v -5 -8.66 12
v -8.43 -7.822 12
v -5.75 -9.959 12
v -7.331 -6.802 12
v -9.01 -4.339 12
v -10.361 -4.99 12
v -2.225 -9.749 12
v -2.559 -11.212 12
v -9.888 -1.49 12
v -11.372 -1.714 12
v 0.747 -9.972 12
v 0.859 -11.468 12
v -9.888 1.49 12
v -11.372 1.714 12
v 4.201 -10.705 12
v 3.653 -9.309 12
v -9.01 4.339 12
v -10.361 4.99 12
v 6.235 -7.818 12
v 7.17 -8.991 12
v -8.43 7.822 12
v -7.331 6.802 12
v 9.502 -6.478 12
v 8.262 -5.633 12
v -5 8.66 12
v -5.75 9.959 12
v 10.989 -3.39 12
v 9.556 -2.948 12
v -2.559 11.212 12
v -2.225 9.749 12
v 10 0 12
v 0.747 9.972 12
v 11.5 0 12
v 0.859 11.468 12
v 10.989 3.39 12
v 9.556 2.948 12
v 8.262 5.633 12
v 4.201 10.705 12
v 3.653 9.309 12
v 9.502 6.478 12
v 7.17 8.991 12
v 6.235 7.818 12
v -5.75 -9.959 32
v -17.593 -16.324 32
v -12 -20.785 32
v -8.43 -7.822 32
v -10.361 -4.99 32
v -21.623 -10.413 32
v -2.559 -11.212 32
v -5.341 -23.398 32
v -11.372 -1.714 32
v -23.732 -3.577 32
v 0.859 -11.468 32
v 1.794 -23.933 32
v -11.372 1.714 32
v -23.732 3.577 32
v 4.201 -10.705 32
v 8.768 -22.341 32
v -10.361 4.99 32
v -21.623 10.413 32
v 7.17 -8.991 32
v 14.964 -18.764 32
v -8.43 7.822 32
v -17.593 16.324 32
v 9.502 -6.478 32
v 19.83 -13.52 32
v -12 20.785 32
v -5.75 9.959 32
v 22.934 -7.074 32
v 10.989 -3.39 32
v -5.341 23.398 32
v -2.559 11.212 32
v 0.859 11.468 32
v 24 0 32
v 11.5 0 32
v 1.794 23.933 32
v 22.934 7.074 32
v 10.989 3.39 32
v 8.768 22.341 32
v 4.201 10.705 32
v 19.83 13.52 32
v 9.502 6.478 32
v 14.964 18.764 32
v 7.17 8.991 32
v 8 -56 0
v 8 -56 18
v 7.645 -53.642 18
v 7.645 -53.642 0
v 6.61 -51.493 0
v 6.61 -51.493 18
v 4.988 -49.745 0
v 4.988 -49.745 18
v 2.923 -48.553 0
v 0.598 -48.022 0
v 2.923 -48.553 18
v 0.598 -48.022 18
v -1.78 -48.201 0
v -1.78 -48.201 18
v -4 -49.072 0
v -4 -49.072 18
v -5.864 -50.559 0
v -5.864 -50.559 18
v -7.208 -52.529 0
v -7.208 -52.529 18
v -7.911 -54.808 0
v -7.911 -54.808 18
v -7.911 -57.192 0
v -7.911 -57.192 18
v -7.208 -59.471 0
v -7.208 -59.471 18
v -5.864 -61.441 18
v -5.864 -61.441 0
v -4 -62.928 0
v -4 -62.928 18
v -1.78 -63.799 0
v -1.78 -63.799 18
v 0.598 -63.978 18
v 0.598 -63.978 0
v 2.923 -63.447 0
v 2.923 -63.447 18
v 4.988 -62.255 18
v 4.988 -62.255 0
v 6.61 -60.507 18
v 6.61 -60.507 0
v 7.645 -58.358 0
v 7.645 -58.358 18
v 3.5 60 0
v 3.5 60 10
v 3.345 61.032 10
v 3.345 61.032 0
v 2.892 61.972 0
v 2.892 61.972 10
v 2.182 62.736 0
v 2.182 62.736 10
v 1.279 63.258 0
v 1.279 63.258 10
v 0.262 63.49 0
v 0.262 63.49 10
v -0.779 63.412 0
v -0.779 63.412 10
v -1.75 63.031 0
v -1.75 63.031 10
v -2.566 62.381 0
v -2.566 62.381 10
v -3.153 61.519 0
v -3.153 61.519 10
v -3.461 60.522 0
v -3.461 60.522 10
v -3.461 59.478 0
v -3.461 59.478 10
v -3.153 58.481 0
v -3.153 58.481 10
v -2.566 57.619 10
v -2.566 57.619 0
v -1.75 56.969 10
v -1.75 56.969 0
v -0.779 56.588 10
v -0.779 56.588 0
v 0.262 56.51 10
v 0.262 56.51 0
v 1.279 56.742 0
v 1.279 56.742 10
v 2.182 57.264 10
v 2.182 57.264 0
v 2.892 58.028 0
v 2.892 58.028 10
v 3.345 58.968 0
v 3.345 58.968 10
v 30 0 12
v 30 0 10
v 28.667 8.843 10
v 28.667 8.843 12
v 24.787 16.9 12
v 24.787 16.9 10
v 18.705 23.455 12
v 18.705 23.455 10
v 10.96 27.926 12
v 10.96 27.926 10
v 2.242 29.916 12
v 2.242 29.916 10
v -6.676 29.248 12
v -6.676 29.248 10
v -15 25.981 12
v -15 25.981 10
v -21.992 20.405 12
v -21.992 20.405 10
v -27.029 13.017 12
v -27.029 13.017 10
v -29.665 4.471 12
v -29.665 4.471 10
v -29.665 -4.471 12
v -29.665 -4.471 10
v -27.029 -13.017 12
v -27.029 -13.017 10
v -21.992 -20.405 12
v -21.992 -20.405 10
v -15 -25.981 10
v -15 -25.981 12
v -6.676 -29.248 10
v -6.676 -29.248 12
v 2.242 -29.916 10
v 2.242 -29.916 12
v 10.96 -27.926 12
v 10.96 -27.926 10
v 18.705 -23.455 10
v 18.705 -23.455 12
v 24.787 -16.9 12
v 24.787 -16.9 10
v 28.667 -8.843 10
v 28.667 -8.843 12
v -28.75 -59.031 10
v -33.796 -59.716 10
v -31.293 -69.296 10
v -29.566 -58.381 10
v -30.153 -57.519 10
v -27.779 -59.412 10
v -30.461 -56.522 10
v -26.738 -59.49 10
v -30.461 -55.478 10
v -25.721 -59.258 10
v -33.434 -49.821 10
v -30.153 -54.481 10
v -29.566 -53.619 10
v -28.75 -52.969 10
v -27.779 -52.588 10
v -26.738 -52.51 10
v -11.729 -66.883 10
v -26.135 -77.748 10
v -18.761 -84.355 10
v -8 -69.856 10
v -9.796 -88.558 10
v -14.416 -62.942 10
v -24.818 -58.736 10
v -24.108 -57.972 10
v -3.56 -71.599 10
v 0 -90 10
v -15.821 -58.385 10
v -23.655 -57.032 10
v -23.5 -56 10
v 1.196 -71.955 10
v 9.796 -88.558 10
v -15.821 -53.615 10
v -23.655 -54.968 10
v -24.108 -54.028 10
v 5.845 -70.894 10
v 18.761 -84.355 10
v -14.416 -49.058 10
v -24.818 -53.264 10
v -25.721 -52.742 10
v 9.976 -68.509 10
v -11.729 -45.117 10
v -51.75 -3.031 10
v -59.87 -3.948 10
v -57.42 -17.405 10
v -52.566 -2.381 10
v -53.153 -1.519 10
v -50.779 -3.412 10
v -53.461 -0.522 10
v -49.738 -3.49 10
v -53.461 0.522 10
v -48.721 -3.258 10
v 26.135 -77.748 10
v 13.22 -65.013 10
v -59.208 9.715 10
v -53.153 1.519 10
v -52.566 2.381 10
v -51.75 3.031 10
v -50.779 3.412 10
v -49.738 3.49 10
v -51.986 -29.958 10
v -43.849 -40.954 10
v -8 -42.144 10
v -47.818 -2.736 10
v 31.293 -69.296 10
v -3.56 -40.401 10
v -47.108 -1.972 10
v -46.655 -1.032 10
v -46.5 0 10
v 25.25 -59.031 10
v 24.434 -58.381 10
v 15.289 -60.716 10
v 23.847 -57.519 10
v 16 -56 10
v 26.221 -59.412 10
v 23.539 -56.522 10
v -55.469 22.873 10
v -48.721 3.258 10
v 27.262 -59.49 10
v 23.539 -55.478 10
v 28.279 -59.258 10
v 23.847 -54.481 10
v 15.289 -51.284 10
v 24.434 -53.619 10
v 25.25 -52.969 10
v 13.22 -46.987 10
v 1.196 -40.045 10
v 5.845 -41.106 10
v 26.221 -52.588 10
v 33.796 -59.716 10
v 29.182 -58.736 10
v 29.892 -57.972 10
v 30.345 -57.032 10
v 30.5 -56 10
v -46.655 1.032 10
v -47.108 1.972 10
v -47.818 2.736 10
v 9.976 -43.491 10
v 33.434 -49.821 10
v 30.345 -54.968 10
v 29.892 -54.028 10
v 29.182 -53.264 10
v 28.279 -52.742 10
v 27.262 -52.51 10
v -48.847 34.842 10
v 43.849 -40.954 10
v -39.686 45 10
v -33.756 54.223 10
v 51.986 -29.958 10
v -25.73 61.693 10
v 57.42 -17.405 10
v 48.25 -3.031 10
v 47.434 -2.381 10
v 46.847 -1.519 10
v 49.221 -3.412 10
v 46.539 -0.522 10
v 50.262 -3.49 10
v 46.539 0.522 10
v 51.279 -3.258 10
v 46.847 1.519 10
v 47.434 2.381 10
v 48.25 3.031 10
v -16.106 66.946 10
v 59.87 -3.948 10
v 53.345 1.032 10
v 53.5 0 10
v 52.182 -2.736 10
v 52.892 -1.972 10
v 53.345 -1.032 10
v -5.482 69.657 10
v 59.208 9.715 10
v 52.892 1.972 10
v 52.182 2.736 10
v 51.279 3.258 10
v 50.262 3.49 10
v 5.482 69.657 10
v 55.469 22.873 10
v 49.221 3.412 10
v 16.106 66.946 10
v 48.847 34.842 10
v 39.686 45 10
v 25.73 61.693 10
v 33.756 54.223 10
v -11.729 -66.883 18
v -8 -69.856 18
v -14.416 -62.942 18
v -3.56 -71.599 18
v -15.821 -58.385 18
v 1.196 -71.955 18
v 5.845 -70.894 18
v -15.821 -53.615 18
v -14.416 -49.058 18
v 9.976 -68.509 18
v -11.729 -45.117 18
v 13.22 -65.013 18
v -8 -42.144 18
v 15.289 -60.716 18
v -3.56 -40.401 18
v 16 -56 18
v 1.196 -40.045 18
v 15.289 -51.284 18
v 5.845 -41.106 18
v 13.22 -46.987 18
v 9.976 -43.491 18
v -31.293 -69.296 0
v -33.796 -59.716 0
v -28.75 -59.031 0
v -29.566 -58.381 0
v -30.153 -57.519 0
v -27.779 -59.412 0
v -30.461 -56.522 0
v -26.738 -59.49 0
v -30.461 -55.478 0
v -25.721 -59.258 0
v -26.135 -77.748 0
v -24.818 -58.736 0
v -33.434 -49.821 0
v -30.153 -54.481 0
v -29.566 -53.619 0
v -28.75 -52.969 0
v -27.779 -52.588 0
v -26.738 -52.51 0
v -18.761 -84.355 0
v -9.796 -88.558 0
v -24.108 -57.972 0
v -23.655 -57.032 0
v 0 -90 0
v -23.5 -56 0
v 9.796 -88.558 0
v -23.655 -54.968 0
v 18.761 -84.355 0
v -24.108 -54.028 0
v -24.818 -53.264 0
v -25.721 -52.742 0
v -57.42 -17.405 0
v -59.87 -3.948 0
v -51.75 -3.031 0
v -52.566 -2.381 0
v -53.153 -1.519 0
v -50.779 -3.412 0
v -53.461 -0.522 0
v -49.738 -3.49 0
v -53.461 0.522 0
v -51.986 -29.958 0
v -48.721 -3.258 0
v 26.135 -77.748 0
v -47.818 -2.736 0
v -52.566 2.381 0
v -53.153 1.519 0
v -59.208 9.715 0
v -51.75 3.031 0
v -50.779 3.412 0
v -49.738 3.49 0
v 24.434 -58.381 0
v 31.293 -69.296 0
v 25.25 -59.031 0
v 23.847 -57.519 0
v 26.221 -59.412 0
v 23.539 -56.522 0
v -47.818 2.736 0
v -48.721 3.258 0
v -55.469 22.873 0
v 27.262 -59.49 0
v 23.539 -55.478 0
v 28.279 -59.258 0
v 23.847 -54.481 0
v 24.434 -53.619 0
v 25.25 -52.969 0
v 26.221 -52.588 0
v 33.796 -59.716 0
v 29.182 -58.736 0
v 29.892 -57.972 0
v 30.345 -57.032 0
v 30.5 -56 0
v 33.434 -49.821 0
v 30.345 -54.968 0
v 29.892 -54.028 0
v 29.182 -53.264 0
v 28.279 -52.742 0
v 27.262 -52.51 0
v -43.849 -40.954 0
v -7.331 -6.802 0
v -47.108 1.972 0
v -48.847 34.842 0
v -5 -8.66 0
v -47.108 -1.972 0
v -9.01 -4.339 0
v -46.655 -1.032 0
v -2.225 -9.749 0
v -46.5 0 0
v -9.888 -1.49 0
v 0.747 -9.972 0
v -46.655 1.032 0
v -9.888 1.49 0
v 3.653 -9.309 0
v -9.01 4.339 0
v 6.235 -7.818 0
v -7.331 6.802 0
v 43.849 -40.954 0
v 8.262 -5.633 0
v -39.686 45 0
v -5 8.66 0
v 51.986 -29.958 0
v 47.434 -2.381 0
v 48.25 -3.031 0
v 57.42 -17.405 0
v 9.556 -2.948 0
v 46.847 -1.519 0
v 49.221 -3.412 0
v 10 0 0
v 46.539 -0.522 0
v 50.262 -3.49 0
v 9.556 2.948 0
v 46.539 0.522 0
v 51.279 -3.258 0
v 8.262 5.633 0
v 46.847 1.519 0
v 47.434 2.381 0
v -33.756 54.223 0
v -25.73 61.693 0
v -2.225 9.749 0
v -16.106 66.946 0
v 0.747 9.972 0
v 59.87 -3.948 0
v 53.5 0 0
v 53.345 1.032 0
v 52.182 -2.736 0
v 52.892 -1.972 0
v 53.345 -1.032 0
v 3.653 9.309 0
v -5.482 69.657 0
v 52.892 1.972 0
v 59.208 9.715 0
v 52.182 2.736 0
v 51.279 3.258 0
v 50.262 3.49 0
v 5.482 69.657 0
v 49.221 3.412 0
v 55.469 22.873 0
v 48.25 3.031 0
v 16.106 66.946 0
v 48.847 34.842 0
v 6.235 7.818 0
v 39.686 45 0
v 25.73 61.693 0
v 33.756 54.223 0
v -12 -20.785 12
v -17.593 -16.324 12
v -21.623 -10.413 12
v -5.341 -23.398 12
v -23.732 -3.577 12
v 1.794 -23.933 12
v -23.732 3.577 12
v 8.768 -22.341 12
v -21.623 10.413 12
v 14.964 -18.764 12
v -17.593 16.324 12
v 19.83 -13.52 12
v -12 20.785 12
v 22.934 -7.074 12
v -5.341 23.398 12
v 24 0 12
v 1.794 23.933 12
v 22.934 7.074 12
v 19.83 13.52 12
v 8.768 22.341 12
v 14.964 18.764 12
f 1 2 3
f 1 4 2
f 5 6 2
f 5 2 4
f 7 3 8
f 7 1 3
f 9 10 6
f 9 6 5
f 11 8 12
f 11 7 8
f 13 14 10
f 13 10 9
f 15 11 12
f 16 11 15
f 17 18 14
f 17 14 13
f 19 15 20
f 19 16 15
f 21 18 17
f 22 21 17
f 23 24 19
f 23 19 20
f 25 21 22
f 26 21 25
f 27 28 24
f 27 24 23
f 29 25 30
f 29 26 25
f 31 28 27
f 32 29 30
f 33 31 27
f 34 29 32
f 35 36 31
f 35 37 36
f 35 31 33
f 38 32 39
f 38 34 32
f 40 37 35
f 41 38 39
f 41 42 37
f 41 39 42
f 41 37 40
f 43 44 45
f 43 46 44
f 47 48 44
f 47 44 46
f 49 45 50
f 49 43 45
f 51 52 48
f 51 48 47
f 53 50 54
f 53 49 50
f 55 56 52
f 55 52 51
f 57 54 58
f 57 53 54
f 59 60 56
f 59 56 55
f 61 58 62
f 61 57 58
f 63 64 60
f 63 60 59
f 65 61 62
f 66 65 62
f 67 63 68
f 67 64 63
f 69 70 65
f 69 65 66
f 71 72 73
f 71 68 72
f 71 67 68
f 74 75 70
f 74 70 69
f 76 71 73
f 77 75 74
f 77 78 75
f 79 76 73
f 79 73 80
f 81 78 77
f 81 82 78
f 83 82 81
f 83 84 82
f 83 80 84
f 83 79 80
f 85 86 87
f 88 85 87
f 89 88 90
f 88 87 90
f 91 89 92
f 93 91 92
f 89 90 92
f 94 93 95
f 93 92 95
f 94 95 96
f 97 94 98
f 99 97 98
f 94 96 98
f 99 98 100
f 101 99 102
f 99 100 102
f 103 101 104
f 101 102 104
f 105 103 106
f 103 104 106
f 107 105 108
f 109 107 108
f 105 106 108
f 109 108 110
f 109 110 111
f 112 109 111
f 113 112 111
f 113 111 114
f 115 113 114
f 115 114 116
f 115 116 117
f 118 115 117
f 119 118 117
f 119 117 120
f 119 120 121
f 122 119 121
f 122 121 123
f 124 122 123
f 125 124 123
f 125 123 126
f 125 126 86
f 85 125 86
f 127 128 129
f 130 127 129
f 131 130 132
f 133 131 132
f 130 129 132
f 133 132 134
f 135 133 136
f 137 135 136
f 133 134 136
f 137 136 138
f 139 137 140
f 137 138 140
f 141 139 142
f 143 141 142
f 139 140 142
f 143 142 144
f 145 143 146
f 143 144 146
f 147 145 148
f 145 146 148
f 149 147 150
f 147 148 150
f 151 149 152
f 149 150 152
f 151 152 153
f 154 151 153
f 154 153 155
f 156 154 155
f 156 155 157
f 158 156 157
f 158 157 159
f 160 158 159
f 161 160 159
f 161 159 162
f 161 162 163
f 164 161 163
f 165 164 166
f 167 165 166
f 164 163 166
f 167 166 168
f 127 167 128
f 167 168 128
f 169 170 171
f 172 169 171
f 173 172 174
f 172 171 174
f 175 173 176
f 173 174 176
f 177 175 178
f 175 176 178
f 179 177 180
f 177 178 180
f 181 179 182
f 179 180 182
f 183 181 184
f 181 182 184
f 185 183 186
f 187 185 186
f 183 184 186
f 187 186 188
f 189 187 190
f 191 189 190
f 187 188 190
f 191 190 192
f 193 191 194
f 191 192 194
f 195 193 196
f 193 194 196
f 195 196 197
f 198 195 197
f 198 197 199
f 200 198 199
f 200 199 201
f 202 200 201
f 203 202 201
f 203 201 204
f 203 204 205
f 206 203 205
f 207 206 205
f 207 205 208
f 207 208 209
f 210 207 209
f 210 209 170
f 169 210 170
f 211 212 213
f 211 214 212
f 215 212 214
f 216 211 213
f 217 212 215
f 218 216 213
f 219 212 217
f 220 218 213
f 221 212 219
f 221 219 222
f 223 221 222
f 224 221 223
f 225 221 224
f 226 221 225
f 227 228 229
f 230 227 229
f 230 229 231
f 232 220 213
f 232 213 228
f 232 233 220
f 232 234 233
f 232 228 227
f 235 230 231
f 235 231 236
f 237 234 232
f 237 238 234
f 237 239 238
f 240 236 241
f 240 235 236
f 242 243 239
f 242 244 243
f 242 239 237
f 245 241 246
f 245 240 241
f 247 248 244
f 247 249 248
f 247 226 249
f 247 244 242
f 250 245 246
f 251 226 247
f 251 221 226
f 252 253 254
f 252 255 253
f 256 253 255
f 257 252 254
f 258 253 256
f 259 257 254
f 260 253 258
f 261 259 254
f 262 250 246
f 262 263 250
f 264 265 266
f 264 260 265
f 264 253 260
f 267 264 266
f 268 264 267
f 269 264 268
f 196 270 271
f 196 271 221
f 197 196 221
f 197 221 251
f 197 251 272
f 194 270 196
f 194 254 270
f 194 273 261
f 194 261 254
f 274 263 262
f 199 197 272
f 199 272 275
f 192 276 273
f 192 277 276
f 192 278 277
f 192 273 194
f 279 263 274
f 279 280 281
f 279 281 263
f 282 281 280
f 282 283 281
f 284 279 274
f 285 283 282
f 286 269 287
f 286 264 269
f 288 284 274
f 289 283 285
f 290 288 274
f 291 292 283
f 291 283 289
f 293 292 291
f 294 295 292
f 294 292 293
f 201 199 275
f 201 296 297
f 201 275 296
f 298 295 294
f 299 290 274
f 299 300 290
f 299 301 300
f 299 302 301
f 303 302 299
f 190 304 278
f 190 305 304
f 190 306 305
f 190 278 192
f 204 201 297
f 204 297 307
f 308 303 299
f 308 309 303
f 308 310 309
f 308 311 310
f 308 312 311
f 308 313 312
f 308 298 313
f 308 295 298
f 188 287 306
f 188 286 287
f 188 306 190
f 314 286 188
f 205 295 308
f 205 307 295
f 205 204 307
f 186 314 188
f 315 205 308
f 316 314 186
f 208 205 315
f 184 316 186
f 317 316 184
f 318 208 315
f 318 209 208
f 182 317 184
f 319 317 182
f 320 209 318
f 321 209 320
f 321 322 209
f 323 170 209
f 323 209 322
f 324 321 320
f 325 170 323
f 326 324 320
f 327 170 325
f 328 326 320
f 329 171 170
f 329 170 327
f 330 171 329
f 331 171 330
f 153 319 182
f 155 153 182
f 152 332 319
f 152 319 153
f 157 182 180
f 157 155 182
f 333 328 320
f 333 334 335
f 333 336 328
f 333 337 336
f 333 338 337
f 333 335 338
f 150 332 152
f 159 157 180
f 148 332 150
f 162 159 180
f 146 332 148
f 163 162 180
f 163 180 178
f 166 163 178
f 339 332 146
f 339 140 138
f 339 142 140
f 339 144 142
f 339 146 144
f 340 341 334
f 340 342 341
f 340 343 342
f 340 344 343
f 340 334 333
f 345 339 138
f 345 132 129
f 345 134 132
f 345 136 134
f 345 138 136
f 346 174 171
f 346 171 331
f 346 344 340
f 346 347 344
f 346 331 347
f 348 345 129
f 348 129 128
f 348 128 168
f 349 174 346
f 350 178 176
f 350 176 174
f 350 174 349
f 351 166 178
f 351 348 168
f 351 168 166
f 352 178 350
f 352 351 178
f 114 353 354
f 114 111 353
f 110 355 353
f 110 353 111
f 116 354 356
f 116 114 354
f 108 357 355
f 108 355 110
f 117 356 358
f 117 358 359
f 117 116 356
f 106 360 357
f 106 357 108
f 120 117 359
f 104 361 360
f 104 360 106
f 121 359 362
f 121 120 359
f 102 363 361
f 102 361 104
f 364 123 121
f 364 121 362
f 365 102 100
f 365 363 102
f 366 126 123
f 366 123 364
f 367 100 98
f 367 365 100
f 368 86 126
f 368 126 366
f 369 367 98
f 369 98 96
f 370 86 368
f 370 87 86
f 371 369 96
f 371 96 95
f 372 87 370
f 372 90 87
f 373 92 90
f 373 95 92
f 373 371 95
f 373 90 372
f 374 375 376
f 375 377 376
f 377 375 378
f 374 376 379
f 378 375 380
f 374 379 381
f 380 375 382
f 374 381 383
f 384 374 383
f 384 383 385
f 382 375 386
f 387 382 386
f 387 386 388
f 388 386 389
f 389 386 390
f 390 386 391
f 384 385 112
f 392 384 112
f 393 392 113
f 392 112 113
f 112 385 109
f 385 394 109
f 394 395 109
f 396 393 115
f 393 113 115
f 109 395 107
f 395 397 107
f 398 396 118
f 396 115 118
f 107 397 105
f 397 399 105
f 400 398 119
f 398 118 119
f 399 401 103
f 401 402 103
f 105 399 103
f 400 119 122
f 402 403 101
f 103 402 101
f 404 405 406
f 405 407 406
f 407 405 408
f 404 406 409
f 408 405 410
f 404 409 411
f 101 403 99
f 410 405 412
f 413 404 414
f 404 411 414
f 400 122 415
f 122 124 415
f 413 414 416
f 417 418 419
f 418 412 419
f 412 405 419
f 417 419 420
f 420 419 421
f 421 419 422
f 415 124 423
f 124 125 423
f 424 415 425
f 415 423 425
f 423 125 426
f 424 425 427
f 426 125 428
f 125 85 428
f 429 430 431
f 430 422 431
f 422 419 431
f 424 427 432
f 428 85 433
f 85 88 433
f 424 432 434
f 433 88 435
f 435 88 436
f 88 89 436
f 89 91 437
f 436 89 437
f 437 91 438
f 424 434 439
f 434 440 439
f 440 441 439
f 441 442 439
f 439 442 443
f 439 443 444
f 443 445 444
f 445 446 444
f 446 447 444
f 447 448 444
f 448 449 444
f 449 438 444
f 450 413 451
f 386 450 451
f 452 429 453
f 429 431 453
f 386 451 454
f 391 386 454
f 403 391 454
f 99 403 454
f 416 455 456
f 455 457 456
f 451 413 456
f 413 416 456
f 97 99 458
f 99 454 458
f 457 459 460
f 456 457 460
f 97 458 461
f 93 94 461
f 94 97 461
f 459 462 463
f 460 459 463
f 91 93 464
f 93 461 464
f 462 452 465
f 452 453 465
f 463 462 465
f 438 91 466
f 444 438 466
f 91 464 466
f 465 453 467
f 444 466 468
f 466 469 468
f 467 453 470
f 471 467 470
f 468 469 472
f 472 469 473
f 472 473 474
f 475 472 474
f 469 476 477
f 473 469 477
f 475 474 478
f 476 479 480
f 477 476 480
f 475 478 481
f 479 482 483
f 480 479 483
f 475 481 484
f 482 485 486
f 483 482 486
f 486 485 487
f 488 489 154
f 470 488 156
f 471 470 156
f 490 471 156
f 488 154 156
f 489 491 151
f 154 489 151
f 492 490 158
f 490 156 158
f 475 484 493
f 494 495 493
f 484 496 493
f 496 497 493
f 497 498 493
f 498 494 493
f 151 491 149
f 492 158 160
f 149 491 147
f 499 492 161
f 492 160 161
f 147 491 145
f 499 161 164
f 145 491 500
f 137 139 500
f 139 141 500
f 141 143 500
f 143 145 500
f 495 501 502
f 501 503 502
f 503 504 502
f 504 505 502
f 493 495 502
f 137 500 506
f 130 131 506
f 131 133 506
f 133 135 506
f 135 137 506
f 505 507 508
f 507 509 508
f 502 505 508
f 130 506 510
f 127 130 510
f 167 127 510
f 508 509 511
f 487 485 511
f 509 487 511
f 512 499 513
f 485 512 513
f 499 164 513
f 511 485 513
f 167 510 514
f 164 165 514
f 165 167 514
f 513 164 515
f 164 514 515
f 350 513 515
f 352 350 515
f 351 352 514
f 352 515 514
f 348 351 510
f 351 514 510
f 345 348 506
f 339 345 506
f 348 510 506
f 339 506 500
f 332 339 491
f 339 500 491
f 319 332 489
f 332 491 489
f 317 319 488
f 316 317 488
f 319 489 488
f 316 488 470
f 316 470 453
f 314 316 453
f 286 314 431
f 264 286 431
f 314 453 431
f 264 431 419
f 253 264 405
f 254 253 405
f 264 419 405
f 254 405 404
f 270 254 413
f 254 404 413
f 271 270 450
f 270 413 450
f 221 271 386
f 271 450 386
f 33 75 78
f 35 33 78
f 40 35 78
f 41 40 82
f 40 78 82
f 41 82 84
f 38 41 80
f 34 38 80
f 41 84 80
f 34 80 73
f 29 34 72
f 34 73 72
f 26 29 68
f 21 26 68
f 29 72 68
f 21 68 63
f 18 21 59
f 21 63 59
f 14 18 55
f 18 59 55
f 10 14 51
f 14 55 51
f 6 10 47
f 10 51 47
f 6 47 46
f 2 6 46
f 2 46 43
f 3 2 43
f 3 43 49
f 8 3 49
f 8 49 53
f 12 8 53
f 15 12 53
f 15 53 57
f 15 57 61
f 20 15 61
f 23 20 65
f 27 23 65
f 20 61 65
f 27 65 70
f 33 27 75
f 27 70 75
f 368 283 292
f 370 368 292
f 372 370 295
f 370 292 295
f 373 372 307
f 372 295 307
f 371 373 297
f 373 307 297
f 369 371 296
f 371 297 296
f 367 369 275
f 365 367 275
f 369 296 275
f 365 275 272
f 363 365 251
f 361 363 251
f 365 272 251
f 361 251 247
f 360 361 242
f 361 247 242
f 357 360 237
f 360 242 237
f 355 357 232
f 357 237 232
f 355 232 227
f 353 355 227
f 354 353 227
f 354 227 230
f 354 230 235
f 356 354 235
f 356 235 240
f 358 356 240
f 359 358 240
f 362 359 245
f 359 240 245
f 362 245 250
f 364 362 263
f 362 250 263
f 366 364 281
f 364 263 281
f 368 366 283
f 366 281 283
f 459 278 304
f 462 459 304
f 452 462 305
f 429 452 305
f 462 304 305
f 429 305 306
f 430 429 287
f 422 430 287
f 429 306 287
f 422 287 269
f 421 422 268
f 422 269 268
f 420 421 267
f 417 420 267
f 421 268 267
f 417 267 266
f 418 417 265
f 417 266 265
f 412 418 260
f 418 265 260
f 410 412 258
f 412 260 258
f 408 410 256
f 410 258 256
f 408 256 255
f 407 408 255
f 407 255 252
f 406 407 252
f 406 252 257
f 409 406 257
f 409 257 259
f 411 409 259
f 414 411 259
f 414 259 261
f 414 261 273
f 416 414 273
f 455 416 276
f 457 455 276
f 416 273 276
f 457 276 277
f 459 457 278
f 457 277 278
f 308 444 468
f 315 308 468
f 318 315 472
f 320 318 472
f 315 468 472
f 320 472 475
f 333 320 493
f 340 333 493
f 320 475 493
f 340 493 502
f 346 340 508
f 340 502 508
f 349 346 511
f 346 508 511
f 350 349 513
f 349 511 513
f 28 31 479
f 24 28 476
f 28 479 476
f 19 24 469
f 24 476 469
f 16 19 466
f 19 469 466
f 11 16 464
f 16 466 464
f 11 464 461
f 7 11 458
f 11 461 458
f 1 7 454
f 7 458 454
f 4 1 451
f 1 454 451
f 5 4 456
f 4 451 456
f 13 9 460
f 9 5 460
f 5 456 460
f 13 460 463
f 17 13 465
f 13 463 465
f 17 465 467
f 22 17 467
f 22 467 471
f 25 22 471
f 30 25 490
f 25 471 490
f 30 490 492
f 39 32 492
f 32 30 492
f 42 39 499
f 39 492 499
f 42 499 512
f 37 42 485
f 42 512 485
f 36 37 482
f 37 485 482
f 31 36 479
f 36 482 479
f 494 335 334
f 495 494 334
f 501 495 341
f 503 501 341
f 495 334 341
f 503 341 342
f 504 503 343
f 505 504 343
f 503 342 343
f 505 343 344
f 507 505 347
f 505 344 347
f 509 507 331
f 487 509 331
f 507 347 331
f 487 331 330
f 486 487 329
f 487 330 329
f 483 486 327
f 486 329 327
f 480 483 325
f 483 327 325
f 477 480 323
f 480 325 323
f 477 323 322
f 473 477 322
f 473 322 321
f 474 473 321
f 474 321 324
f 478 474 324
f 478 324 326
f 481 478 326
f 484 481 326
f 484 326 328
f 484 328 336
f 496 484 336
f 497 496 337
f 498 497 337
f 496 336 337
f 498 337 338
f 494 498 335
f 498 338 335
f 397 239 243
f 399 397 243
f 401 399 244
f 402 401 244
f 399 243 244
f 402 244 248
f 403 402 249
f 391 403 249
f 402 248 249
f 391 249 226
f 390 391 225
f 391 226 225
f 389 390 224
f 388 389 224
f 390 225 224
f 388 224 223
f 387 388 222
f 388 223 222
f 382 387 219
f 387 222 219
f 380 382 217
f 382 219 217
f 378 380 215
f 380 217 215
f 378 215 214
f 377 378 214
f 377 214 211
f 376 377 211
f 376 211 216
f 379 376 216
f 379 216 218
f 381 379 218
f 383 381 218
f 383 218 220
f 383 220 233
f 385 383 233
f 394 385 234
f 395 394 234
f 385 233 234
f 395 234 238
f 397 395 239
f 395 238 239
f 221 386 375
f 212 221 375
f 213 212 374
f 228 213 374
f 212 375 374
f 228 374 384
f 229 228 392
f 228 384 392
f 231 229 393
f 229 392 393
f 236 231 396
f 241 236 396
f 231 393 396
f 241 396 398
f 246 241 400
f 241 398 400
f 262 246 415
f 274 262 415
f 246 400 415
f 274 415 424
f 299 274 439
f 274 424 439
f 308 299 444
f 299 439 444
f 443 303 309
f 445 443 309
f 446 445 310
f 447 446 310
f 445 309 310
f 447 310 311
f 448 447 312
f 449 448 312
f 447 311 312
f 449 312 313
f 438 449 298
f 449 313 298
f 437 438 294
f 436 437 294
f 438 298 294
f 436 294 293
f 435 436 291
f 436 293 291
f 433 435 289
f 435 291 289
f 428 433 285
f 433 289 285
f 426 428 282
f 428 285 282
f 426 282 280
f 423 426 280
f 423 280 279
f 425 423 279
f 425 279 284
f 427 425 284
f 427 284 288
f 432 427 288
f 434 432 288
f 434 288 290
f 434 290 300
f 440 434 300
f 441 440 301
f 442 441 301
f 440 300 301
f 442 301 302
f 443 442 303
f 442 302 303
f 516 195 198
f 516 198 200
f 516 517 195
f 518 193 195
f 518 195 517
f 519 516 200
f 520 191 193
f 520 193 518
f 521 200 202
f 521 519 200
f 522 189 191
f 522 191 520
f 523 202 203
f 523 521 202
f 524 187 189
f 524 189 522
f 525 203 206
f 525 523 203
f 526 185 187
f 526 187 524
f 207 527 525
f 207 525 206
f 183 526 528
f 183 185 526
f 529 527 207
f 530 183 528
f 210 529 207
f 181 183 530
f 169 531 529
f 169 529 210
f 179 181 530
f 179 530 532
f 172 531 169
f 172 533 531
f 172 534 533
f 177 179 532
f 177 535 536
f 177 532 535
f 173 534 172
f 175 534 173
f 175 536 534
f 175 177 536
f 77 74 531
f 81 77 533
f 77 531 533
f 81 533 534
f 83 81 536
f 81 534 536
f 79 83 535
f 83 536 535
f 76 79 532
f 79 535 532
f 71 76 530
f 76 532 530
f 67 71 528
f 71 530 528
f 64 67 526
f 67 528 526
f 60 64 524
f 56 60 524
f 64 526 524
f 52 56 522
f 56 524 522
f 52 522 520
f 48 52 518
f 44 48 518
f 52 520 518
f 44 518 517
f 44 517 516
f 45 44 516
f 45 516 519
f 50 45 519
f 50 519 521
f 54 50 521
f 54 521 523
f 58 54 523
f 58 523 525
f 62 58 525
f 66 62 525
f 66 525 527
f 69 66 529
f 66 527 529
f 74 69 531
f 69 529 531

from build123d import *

# Parameters (mm, degrees)
F0_DEPTH  = 10
F17_R     = 30
F18_DEPTH = 12
F1_R      = 24
F2_DEPTH  = 20
F3_R      = 10
F4_DEPTH  = 25
F19_R     = 10
F5_DEPTH  = 30
F6_R      = 10
F7_DEPTH  = 30
F20_R     = 16
F8_DEPTH  = 8
F21_R     = 8
F9_DEPTH  = 25
F10_R     = 10
F11_DEPTH = 35
F12_R     = 11.5
F12_R_2   = 10
F13_DEPTH = 20
F14_R     = 3.5
F15_DEPTH = 10


with BuildPart() as f0:
    # F16 (on Top) → F0 (new body)
    with BuildSketch(Plane.XY):
        with BuildLine():
            ThreePointArc((39.686269666, 45), (0, 70), (-39.686269666, 45))
            ThreePointArc((-39.686269666, 45), (-59.8699875201, -3.9477328098), (-33.4338938071, -49.8214285714))
            ThreePointArc((-33.4338938071, -49.8214285714), (0, -90), (33.4338938071, -49.8214285714))
            ThreePointArc((33.4338938071, -49.8214285714), (59.8699875201, -3.9477328098), (39.686269666, 45))
        make_face()
    extrude(amount=F0_DEPTH)

    # F17 (on Top) → F18 (join)
    with BuildSketch(Plane.XY):
        Circle(F17_R)
    extrude(amount=F18_DEPTH)

    # F1 (on face) → F2 (join)
    with BuildSketch(Plane.XY.offset(12)):
        Circle(F1_R)
    extrude(amount=F2_DEPTH)

    # F3 (on face) → F4 (cut)
    with BuildSketch(Plane.XY.offset(32)):
        Circle(F3_R)
    extrude(amount=-F4_DEPTH, mode=Mode.SUBTRACT)

    # F19 (on face) → F5 (cut)
    with BuildSketch(Plane(origin=(0, 0, 0), x_dir=(1, 0, 0), z_dir=(0, 0, -1))):
        Circle(F19_R)
    extrude(amount=-F5_DEPTH, mode=Mode.SUBTRACT)

    # F6 (on face) → F7 (cut)
    with BuildSketch(Plane.XY.offset(32)):
        Circle(F6_R)
    extrude(amount=-F7_DEPTH, mode=Mode.SUBTRACT)

    # F20 (on face) → F8 (join)
    with BuildSketch(Plane.XY.offset(10)):
        with Locations((0, -56)):
            Circle(F20_R)
    extrude(amount=F8_DEPTH)

    # F21 (on face) → F9 (cut)
    with BuildSketch(Plane.XY.offset(18)):
        with Locations((0, -56)):
            Circle(F21_R)
    extrude(amount=-F9_DEPTH, mode=Mode.SUBTRACT)

    # F10 (on face) → F11 (cut)
    with BuildSketch(Plane.XY.offset(32)):
        Circle(F10_R)
    extrude(amount=-F11_DEPTH, mode=Mode.SUBTRACT)

    # F12 (on face) → F13 (cut)
    with BuildSketch(Plane.XY.offset(32)):
        Circle(F12_R)
        Circle(F12_R_2, mode=Mode.SUBTRACT)
    extrude(amount=-F13_DEPTH, mode=Mode.SUBTRACT)

    # F14 (on face) → F15 (cut)
    with BuildSketch(Plane.XY.offset(10)):
        with Locations((-27, -56)):
            Circle(F14_R)
        with Locations((27, -56)):
            Circle(F14_R)
        with Locations((-50, 0)):
            Circle(F14_R)
        with Locations((50, 0)):
            Circle(F14_R)
        with Locations((0, 60)):
            Circle(F14_R)
    extrude(amount=-F15_DEPTH, mode=Mode.SUBTRACT)


solid = f0.part
